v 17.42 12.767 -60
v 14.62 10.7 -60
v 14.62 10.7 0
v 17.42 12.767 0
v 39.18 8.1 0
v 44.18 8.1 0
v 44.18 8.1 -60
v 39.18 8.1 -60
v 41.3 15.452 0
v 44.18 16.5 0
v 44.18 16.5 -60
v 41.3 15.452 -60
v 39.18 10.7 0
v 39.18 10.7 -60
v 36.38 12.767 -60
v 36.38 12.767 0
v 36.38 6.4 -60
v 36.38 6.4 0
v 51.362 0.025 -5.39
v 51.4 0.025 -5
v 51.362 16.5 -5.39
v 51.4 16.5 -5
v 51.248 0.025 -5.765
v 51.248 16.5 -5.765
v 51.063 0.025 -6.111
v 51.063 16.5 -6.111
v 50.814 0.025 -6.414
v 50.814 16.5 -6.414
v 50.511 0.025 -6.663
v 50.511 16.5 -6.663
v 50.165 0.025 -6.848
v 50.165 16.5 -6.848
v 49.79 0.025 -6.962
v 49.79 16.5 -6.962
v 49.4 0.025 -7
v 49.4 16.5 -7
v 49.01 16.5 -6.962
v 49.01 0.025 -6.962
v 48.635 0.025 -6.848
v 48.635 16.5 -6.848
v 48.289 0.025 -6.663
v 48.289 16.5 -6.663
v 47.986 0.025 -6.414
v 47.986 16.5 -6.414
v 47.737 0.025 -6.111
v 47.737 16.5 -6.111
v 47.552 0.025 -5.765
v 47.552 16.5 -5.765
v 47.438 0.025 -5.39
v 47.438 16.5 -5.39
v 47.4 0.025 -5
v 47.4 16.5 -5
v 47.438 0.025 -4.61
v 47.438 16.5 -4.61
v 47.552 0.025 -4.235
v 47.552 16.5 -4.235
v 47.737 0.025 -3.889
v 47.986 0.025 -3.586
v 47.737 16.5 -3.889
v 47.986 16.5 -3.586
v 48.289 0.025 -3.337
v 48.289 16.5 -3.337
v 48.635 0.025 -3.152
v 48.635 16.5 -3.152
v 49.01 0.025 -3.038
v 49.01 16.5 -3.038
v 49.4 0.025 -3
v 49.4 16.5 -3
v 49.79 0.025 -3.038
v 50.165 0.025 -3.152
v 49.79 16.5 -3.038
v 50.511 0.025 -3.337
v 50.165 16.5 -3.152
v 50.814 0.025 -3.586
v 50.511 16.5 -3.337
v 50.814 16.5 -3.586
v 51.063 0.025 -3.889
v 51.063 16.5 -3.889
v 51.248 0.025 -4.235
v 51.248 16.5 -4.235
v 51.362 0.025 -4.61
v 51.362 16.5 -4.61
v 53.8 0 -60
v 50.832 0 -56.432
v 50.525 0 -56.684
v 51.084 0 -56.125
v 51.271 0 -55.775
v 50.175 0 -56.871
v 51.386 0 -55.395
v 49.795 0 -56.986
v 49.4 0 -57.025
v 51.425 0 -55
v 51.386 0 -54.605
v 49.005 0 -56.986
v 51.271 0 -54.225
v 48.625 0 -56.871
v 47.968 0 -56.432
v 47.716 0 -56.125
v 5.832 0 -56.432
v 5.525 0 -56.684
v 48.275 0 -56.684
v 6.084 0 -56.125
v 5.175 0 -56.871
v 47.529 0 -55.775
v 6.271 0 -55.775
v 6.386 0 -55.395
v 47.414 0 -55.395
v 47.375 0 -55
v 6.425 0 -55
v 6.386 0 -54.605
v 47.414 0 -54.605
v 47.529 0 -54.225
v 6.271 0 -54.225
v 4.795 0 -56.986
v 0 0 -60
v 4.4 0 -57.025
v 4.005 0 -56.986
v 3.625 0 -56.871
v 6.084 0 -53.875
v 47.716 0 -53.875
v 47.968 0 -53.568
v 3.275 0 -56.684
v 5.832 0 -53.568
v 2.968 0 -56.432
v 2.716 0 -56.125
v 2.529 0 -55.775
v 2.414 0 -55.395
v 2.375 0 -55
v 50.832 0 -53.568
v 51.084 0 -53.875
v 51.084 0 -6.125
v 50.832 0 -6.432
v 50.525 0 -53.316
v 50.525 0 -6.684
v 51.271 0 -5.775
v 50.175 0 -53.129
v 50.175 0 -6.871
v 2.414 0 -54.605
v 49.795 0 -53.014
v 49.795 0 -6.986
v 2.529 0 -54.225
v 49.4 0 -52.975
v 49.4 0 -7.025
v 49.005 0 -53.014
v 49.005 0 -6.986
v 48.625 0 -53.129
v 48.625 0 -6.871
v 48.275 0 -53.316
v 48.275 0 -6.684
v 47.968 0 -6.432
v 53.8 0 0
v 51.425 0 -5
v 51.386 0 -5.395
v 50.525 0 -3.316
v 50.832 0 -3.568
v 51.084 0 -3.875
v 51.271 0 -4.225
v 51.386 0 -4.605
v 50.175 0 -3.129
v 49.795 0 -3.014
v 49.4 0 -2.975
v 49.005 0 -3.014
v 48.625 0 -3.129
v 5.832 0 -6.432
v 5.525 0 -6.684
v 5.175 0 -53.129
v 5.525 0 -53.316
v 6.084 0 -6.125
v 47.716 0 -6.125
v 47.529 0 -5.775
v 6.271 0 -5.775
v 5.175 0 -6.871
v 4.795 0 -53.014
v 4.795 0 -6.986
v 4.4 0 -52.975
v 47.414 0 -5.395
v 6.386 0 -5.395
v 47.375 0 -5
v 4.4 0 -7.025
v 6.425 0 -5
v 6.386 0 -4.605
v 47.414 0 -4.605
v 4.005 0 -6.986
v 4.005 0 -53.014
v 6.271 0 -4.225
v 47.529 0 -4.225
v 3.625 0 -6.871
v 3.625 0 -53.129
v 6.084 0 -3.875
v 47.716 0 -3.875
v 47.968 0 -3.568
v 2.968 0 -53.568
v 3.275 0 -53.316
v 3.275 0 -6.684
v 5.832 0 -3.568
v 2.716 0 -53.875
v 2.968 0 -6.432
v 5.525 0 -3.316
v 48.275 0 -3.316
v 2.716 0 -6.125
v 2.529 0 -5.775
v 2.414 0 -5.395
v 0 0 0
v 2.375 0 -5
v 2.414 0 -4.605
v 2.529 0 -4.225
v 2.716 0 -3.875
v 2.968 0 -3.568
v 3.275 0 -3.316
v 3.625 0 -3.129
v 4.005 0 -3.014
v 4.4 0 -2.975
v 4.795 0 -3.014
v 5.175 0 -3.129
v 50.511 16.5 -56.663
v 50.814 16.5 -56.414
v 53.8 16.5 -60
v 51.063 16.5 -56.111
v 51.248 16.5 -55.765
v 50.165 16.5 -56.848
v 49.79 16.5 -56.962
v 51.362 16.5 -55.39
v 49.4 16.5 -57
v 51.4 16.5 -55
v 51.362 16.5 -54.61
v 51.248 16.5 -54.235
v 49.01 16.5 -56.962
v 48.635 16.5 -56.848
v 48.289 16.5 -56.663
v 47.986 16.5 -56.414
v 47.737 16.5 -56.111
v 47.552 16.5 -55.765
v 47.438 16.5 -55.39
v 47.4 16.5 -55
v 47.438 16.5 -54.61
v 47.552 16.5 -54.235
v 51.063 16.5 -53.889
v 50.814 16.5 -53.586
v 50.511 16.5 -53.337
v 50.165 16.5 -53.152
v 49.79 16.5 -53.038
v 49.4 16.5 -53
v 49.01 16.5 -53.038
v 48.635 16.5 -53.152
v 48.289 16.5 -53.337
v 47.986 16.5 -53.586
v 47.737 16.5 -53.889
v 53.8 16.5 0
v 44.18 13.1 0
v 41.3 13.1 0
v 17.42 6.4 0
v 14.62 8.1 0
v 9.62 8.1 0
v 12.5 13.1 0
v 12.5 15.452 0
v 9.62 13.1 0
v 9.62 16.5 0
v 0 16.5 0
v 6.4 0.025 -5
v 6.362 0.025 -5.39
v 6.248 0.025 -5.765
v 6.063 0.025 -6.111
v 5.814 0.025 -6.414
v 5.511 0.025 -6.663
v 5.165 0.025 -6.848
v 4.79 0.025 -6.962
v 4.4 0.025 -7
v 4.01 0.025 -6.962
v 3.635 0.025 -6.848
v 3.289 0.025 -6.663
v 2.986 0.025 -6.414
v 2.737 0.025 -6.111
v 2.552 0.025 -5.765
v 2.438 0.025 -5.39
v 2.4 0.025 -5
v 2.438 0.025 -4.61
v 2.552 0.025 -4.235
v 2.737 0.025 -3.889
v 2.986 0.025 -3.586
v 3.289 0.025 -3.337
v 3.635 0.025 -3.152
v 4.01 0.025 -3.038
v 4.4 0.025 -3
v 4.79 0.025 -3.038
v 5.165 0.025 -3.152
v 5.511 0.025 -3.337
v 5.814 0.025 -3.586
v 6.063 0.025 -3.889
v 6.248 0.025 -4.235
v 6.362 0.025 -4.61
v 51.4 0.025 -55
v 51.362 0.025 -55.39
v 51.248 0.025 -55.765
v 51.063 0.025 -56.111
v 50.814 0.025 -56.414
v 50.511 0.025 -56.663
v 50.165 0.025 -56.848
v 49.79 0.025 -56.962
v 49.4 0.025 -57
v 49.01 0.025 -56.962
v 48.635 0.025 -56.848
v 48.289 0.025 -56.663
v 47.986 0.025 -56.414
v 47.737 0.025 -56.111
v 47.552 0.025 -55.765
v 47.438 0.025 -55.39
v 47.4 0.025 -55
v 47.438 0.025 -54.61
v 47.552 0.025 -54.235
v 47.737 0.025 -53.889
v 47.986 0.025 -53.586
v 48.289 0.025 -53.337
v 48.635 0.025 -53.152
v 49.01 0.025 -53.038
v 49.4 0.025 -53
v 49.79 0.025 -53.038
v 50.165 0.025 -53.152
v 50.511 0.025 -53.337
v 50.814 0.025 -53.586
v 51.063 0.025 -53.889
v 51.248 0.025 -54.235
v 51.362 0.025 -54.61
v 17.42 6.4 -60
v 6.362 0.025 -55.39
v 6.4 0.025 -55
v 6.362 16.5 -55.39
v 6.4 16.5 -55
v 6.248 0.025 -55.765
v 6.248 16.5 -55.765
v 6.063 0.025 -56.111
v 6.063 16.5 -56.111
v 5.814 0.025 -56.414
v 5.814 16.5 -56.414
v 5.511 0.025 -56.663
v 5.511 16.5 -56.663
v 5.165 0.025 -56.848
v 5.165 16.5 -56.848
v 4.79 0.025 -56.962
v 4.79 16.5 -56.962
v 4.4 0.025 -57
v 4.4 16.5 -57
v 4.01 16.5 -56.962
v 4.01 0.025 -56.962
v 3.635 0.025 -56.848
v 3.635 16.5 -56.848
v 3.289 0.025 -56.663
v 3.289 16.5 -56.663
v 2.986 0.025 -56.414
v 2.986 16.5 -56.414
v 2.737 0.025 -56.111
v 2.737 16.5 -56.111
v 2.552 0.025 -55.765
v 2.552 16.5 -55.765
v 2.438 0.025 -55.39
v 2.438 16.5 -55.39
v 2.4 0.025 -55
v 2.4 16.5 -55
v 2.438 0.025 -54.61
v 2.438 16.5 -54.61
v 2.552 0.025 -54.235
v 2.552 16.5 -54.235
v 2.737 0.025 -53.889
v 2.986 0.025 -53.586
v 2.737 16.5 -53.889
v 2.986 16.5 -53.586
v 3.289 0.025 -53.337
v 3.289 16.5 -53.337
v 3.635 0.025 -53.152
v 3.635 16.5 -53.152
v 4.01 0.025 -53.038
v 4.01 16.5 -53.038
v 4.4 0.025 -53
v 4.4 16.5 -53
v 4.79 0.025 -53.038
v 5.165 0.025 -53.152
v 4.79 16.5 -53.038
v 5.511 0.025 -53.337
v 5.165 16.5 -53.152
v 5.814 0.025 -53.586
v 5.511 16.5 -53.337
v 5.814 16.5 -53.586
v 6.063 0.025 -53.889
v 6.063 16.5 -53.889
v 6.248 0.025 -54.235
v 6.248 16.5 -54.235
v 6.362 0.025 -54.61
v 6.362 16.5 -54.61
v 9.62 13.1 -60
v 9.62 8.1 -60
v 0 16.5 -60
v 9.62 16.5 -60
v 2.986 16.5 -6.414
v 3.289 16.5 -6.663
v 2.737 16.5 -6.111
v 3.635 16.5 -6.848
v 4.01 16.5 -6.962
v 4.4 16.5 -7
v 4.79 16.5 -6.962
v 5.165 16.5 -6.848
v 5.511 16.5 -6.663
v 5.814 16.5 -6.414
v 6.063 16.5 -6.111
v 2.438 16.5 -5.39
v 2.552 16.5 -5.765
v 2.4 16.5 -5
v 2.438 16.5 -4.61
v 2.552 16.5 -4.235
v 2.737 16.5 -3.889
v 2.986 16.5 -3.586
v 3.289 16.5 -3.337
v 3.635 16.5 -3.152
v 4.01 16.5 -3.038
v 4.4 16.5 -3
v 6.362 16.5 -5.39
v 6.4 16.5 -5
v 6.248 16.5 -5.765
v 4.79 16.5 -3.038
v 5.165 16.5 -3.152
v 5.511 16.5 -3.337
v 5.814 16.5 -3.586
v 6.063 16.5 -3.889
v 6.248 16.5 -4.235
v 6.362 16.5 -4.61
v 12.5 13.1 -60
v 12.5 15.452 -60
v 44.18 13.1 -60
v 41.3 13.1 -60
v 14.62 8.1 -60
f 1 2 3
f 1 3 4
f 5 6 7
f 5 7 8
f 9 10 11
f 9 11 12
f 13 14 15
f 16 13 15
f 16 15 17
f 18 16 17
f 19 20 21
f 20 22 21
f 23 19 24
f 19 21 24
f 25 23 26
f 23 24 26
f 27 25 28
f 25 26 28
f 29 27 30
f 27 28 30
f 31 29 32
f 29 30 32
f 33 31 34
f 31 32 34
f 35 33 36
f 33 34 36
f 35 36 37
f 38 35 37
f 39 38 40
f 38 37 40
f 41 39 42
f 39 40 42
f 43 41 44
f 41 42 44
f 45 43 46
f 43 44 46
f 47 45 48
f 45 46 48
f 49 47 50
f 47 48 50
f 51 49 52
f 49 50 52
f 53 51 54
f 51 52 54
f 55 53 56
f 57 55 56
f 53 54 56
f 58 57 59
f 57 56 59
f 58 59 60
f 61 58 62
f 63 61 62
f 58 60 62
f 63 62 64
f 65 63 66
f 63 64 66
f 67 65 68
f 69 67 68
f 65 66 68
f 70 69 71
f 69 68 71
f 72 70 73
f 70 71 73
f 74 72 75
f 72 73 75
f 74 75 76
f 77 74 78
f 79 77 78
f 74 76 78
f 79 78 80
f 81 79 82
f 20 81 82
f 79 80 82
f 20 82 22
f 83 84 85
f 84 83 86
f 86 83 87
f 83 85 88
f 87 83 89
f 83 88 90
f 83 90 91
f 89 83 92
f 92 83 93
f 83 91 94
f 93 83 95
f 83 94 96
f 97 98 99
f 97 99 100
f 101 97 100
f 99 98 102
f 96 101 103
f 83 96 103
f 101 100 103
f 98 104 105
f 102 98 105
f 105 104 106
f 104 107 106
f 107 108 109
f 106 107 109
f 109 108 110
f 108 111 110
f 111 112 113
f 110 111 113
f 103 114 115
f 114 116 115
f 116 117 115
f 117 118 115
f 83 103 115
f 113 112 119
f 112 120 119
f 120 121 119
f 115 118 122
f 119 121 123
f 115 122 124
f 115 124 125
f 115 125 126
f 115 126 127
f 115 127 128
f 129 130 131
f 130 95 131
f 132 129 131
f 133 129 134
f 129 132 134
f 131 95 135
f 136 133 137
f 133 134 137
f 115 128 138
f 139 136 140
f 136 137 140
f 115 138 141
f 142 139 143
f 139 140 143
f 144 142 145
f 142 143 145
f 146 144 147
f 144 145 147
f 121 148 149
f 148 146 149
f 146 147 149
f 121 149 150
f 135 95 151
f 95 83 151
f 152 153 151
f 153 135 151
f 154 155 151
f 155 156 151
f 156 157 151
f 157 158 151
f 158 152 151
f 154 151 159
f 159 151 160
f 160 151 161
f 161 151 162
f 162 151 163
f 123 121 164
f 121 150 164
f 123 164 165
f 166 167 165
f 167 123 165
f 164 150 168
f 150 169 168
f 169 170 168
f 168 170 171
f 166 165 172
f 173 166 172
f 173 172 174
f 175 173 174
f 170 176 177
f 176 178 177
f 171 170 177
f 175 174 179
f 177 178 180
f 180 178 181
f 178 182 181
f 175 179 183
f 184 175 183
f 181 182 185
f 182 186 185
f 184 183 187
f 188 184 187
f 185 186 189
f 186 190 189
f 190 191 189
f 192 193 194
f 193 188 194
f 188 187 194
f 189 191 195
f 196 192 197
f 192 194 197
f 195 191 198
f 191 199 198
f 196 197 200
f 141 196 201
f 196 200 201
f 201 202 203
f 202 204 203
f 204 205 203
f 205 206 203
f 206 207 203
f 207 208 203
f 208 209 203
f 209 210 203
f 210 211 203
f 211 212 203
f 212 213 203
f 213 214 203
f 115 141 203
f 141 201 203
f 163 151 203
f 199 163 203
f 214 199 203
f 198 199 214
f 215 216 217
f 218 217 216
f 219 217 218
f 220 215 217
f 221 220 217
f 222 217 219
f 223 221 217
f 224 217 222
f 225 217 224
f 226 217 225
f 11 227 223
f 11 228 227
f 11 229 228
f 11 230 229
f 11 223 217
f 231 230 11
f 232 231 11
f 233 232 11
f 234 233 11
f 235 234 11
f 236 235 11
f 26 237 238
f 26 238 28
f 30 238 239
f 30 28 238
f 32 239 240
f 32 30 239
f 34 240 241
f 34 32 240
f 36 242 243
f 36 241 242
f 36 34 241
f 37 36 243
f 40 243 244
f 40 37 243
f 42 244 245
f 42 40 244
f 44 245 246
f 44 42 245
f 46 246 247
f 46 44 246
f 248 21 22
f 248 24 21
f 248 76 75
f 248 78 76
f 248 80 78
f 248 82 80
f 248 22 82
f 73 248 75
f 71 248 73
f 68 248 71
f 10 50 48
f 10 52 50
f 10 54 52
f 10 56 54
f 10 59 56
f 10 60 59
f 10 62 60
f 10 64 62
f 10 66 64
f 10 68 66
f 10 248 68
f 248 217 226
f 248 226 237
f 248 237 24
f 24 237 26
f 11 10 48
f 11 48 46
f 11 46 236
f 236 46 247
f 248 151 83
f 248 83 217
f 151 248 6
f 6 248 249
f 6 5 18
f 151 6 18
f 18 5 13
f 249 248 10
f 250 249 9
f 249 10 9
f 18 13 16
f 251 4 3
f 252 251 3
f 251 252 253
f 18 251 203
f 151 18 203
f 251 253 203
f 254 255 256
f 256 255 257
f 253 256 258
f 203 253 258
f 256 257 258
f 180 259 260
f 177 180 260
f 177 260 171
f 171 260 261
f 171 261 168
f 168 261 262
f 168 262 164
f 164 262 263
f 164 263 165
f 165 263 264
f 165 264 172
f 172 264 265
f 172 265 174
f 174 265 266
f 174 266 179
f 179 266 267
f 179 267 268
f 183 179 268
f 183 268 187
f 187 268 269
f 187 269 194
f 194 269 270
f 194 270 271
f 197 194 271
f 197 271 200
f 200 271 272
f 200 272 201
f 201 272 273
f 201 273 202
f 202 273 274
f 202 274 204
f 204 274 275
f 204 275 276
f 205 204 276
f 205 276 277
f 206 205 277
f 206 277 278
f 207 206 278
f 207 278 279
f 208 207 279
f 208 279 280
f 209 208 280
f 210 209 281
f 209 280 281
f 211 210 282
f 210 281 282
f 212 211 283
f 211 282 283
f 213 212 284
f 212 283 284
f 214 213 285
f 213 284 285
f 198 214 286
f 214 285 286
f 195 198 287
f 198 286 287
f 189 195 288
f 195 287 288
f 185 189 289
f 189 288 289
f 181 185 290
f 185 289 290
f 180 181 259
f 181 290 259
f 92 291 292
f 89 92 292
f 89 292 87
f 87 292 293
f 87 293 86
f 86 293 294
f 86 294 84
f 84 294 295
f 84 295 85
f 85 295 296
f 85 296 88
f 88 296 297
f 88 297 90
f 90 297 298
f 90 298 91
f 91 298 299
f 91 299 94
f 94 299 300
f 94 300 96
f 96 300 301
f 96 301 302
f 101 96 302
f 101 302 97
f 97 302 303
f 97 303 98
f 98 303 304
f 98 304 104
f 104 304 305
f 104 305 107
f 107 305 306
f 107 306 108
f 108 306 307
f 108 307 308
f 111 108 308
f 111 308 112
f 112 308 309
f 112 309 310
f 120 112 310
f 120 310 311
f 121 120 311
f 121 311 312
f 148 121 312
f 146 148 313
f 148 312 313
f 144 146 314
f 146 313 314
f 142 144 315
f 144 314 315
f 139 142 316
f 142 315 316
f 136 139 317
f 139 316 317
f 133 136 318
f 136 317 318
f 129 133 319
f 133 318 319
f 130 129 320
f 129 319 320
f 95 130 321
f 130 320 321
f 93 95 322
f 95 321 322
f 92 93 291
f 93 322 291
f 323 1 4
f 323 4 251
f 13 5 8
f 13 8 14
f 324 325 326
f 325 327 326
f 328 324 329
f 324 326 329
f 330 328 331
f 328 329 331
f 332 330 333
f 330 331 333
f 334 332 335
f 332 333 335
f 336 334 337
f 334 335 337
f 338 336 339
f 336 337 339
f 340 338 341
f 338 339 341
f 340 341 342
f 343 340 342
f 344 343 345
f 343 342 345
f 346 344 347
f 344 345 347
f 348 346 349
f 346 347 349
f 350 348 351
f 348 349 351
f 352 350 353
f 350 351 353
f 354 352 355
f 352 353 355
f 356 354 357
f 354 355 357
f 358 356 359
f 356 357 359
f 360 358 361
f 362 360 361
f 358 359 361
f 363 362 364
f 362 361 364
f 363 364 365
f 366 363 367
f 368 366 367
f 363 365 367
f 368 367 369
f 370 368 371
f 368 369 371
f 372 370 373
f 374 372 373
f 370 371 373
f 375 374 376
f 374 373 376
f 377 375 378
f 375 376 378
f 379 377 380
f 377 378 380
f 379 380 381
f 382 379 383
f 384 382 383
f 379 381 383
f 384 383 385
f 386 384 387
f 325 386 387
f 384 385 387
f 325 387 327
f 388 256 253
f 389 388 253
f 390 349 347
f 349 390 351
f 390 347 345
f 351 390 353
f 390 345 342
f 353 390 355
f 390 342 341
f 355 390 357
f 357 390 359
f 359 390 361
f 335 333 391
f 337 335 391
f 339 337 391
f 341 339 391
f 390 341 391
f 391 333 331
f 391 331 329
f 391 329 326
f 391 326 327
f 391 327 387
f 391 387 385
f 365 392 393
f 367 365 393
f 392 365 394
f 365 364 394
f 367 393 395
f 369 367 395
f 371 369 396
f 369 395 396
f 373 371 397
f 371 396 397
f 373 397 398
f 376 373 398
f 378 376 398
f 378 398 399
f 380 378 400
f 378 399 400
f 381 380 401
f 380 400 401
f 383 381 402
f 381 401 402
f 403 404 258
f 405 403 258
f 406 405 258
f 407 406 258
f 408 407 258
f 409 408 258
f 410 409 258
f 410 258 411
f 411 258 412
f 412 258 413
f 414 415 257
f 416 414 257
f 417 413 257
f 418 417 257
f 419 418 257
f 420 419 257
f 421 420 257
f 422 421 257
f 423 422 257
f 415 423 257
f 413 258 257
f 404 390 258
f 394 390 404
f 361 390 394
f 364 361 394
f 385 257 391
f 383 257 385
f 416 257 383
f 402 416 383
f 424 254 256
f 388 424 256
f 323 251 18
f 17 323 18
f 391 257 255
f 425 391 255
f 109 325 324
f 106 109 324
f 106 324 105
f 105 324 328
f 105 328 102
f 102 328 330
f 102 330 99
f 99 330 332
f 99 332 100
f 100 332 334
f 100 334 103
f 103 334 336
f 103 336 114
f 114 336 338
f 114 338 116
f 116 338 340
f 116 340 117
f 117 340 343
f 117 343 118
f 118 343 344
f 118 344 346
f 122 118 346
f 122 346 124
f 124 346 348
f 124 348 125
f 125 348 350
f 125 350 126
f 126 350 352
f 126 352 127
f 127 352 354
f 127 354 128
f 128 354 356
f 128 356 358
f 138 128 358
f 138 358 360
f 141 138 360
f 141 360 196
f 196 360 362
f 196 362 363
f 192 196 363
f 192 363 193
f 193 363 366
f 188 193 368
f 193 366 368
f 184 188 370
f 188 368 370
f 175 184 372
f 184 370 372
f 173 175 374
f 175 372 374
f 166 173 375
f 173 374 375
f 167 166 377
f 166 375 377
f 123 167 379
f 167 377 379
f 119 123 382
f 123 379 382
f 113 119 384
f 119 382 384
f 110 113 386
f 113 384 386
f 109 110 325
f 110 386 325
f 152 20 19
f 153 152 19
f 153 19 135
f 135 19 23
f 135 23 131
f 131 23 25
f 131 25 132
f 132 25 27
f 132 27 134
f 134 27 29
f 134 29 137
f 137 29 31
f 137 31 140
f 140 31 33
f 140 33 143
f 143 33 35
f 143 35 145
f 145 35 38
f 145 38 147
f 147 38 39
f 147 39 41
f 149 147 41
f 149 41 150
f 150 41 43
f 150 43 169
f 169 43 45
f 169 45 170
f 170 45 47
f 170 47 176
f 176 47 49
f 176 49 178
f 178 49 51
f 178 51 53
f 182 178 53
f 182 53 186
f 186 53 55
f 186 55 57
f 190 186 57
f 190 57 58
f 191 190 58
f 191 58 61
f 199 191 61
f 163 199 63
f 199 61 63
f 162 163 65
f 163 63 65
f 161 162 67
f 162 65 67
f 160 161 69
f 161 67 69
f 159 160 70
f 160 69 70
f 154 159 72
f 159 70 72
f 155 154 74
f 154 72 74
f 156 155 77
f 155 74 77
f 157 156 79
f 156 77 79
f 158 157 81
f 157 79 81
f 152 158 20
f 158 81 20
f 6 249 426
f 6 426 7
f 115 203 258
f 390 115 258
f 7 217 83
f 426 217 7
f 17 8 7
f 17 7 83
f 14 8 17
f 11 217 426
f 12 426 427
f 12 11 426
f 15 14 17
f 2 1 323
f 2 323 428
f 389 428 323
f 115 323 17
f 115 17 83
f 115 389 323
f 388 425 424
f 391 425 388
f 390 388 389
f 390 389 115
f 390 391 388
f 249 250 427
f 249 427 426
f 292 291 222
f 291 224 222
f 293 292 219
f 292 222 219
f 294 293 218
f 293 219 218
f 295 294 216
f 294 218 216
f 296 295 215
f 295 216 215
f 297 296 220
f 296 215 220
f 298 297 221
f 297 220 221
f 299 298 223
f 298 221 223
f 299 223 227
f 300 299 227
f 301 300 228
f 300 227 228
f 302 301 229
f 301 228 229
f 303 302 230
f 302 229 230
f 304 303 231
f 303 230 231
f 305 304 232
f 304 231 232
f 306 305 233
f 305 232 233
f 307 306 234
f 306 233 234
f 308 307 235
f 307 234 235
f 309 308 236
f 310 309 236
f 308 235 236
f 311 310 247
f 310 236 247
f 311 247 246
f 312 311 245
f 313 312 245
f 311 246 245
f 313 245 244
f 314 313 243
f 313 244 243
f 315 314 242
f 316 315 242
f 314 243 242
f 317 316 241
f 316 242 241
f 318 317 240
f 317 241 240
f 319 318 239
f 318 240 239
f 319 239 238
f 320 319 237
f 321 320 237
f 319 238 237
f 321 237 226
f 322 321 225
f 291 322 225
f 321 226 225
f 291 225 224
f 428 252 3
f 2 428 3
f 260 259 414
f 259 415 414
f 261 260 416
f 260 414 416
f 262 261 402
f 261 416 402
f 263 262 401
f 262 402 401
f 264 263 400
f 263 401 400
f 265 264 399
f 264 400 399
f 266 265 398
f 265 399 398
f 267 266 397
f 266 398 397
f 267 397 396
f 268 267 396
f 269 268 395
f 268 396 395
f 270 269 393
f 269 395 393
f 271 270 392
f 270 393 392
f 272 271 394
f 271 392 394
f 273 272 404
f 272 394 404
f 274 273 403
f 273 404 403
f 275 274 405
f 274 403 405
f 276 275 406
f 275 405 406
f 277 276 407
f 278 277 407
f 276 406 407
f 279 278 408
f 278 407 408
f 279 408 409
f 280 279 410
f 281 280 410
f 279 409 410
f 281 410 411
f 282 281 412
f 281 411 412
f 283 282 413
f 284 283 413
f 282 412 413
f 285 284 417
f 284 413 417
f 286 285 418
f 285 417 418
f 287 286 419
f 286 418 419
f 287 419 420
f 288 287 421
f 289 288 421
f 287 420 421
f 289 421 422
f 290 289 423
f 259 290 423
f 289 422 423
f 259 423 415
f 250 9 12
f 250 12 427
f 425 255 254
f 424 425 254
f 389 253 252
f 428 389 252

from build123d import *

# Parameters (mm, degrees)
BOSS_EXTRUDE1_DEPTH             = 60
F_4_0MM_DOWEL_HOLE1_D           = 4
F_4_0MM_DOWEL_HOLE1_CSINK_D     = 4.05
F_4_0MM_DOWEL_HOLE1_CSINK_ANGLE = 90


with BuildPart() as part:
    # Sketch2 → Boss-Extrude1 (new body)
    with BuildSketch(Plane.XY):
        Polygon((36.38, 6.4), (26.9, 6.4), (26.9, 0), (53.8, 0), (53.8, 16.5), (44.18, 16.5), (41.3, 15.451765725), (41.3, 13.1), (44.18, 13.1), (44.18, 8.1), (39.18, 8.1), (39.18, 10.7), (36.38, 12.766601886), align=None)
    boss_extrude1 = extrude(amount=-BOSS_EXTRUDE1_DEPTH)

    # Mirror1: Boss-Extrude1 across plane
    add(boss_extrude1.mirror(Plane(origin=(26.9, 0, -60), x_dir=(0, 0, 1), z_dir=(1, 0, 0))))

    # Ø4.0mm Dowel Hole1 (through all)
    with Locations(Plane(origin=(0, 0, 0), x_dir=(-1, 0, 0), z_dir=(0, -1, 0))):
        with Locations((-49.4, 55), (-4.4, 55), (-4.4, 5), (-49.4, 5)):
            CounterSinkHole(F_4_0MM_DOWEL_HOLE1_D / 2, F_4_0MM_DOWEL_HOLE1_CSINK_D / 2, counter_sink_angle=F_4_0MM_DOWEL_HOLE1_CSINK_ANGLE)


solid = part.part
